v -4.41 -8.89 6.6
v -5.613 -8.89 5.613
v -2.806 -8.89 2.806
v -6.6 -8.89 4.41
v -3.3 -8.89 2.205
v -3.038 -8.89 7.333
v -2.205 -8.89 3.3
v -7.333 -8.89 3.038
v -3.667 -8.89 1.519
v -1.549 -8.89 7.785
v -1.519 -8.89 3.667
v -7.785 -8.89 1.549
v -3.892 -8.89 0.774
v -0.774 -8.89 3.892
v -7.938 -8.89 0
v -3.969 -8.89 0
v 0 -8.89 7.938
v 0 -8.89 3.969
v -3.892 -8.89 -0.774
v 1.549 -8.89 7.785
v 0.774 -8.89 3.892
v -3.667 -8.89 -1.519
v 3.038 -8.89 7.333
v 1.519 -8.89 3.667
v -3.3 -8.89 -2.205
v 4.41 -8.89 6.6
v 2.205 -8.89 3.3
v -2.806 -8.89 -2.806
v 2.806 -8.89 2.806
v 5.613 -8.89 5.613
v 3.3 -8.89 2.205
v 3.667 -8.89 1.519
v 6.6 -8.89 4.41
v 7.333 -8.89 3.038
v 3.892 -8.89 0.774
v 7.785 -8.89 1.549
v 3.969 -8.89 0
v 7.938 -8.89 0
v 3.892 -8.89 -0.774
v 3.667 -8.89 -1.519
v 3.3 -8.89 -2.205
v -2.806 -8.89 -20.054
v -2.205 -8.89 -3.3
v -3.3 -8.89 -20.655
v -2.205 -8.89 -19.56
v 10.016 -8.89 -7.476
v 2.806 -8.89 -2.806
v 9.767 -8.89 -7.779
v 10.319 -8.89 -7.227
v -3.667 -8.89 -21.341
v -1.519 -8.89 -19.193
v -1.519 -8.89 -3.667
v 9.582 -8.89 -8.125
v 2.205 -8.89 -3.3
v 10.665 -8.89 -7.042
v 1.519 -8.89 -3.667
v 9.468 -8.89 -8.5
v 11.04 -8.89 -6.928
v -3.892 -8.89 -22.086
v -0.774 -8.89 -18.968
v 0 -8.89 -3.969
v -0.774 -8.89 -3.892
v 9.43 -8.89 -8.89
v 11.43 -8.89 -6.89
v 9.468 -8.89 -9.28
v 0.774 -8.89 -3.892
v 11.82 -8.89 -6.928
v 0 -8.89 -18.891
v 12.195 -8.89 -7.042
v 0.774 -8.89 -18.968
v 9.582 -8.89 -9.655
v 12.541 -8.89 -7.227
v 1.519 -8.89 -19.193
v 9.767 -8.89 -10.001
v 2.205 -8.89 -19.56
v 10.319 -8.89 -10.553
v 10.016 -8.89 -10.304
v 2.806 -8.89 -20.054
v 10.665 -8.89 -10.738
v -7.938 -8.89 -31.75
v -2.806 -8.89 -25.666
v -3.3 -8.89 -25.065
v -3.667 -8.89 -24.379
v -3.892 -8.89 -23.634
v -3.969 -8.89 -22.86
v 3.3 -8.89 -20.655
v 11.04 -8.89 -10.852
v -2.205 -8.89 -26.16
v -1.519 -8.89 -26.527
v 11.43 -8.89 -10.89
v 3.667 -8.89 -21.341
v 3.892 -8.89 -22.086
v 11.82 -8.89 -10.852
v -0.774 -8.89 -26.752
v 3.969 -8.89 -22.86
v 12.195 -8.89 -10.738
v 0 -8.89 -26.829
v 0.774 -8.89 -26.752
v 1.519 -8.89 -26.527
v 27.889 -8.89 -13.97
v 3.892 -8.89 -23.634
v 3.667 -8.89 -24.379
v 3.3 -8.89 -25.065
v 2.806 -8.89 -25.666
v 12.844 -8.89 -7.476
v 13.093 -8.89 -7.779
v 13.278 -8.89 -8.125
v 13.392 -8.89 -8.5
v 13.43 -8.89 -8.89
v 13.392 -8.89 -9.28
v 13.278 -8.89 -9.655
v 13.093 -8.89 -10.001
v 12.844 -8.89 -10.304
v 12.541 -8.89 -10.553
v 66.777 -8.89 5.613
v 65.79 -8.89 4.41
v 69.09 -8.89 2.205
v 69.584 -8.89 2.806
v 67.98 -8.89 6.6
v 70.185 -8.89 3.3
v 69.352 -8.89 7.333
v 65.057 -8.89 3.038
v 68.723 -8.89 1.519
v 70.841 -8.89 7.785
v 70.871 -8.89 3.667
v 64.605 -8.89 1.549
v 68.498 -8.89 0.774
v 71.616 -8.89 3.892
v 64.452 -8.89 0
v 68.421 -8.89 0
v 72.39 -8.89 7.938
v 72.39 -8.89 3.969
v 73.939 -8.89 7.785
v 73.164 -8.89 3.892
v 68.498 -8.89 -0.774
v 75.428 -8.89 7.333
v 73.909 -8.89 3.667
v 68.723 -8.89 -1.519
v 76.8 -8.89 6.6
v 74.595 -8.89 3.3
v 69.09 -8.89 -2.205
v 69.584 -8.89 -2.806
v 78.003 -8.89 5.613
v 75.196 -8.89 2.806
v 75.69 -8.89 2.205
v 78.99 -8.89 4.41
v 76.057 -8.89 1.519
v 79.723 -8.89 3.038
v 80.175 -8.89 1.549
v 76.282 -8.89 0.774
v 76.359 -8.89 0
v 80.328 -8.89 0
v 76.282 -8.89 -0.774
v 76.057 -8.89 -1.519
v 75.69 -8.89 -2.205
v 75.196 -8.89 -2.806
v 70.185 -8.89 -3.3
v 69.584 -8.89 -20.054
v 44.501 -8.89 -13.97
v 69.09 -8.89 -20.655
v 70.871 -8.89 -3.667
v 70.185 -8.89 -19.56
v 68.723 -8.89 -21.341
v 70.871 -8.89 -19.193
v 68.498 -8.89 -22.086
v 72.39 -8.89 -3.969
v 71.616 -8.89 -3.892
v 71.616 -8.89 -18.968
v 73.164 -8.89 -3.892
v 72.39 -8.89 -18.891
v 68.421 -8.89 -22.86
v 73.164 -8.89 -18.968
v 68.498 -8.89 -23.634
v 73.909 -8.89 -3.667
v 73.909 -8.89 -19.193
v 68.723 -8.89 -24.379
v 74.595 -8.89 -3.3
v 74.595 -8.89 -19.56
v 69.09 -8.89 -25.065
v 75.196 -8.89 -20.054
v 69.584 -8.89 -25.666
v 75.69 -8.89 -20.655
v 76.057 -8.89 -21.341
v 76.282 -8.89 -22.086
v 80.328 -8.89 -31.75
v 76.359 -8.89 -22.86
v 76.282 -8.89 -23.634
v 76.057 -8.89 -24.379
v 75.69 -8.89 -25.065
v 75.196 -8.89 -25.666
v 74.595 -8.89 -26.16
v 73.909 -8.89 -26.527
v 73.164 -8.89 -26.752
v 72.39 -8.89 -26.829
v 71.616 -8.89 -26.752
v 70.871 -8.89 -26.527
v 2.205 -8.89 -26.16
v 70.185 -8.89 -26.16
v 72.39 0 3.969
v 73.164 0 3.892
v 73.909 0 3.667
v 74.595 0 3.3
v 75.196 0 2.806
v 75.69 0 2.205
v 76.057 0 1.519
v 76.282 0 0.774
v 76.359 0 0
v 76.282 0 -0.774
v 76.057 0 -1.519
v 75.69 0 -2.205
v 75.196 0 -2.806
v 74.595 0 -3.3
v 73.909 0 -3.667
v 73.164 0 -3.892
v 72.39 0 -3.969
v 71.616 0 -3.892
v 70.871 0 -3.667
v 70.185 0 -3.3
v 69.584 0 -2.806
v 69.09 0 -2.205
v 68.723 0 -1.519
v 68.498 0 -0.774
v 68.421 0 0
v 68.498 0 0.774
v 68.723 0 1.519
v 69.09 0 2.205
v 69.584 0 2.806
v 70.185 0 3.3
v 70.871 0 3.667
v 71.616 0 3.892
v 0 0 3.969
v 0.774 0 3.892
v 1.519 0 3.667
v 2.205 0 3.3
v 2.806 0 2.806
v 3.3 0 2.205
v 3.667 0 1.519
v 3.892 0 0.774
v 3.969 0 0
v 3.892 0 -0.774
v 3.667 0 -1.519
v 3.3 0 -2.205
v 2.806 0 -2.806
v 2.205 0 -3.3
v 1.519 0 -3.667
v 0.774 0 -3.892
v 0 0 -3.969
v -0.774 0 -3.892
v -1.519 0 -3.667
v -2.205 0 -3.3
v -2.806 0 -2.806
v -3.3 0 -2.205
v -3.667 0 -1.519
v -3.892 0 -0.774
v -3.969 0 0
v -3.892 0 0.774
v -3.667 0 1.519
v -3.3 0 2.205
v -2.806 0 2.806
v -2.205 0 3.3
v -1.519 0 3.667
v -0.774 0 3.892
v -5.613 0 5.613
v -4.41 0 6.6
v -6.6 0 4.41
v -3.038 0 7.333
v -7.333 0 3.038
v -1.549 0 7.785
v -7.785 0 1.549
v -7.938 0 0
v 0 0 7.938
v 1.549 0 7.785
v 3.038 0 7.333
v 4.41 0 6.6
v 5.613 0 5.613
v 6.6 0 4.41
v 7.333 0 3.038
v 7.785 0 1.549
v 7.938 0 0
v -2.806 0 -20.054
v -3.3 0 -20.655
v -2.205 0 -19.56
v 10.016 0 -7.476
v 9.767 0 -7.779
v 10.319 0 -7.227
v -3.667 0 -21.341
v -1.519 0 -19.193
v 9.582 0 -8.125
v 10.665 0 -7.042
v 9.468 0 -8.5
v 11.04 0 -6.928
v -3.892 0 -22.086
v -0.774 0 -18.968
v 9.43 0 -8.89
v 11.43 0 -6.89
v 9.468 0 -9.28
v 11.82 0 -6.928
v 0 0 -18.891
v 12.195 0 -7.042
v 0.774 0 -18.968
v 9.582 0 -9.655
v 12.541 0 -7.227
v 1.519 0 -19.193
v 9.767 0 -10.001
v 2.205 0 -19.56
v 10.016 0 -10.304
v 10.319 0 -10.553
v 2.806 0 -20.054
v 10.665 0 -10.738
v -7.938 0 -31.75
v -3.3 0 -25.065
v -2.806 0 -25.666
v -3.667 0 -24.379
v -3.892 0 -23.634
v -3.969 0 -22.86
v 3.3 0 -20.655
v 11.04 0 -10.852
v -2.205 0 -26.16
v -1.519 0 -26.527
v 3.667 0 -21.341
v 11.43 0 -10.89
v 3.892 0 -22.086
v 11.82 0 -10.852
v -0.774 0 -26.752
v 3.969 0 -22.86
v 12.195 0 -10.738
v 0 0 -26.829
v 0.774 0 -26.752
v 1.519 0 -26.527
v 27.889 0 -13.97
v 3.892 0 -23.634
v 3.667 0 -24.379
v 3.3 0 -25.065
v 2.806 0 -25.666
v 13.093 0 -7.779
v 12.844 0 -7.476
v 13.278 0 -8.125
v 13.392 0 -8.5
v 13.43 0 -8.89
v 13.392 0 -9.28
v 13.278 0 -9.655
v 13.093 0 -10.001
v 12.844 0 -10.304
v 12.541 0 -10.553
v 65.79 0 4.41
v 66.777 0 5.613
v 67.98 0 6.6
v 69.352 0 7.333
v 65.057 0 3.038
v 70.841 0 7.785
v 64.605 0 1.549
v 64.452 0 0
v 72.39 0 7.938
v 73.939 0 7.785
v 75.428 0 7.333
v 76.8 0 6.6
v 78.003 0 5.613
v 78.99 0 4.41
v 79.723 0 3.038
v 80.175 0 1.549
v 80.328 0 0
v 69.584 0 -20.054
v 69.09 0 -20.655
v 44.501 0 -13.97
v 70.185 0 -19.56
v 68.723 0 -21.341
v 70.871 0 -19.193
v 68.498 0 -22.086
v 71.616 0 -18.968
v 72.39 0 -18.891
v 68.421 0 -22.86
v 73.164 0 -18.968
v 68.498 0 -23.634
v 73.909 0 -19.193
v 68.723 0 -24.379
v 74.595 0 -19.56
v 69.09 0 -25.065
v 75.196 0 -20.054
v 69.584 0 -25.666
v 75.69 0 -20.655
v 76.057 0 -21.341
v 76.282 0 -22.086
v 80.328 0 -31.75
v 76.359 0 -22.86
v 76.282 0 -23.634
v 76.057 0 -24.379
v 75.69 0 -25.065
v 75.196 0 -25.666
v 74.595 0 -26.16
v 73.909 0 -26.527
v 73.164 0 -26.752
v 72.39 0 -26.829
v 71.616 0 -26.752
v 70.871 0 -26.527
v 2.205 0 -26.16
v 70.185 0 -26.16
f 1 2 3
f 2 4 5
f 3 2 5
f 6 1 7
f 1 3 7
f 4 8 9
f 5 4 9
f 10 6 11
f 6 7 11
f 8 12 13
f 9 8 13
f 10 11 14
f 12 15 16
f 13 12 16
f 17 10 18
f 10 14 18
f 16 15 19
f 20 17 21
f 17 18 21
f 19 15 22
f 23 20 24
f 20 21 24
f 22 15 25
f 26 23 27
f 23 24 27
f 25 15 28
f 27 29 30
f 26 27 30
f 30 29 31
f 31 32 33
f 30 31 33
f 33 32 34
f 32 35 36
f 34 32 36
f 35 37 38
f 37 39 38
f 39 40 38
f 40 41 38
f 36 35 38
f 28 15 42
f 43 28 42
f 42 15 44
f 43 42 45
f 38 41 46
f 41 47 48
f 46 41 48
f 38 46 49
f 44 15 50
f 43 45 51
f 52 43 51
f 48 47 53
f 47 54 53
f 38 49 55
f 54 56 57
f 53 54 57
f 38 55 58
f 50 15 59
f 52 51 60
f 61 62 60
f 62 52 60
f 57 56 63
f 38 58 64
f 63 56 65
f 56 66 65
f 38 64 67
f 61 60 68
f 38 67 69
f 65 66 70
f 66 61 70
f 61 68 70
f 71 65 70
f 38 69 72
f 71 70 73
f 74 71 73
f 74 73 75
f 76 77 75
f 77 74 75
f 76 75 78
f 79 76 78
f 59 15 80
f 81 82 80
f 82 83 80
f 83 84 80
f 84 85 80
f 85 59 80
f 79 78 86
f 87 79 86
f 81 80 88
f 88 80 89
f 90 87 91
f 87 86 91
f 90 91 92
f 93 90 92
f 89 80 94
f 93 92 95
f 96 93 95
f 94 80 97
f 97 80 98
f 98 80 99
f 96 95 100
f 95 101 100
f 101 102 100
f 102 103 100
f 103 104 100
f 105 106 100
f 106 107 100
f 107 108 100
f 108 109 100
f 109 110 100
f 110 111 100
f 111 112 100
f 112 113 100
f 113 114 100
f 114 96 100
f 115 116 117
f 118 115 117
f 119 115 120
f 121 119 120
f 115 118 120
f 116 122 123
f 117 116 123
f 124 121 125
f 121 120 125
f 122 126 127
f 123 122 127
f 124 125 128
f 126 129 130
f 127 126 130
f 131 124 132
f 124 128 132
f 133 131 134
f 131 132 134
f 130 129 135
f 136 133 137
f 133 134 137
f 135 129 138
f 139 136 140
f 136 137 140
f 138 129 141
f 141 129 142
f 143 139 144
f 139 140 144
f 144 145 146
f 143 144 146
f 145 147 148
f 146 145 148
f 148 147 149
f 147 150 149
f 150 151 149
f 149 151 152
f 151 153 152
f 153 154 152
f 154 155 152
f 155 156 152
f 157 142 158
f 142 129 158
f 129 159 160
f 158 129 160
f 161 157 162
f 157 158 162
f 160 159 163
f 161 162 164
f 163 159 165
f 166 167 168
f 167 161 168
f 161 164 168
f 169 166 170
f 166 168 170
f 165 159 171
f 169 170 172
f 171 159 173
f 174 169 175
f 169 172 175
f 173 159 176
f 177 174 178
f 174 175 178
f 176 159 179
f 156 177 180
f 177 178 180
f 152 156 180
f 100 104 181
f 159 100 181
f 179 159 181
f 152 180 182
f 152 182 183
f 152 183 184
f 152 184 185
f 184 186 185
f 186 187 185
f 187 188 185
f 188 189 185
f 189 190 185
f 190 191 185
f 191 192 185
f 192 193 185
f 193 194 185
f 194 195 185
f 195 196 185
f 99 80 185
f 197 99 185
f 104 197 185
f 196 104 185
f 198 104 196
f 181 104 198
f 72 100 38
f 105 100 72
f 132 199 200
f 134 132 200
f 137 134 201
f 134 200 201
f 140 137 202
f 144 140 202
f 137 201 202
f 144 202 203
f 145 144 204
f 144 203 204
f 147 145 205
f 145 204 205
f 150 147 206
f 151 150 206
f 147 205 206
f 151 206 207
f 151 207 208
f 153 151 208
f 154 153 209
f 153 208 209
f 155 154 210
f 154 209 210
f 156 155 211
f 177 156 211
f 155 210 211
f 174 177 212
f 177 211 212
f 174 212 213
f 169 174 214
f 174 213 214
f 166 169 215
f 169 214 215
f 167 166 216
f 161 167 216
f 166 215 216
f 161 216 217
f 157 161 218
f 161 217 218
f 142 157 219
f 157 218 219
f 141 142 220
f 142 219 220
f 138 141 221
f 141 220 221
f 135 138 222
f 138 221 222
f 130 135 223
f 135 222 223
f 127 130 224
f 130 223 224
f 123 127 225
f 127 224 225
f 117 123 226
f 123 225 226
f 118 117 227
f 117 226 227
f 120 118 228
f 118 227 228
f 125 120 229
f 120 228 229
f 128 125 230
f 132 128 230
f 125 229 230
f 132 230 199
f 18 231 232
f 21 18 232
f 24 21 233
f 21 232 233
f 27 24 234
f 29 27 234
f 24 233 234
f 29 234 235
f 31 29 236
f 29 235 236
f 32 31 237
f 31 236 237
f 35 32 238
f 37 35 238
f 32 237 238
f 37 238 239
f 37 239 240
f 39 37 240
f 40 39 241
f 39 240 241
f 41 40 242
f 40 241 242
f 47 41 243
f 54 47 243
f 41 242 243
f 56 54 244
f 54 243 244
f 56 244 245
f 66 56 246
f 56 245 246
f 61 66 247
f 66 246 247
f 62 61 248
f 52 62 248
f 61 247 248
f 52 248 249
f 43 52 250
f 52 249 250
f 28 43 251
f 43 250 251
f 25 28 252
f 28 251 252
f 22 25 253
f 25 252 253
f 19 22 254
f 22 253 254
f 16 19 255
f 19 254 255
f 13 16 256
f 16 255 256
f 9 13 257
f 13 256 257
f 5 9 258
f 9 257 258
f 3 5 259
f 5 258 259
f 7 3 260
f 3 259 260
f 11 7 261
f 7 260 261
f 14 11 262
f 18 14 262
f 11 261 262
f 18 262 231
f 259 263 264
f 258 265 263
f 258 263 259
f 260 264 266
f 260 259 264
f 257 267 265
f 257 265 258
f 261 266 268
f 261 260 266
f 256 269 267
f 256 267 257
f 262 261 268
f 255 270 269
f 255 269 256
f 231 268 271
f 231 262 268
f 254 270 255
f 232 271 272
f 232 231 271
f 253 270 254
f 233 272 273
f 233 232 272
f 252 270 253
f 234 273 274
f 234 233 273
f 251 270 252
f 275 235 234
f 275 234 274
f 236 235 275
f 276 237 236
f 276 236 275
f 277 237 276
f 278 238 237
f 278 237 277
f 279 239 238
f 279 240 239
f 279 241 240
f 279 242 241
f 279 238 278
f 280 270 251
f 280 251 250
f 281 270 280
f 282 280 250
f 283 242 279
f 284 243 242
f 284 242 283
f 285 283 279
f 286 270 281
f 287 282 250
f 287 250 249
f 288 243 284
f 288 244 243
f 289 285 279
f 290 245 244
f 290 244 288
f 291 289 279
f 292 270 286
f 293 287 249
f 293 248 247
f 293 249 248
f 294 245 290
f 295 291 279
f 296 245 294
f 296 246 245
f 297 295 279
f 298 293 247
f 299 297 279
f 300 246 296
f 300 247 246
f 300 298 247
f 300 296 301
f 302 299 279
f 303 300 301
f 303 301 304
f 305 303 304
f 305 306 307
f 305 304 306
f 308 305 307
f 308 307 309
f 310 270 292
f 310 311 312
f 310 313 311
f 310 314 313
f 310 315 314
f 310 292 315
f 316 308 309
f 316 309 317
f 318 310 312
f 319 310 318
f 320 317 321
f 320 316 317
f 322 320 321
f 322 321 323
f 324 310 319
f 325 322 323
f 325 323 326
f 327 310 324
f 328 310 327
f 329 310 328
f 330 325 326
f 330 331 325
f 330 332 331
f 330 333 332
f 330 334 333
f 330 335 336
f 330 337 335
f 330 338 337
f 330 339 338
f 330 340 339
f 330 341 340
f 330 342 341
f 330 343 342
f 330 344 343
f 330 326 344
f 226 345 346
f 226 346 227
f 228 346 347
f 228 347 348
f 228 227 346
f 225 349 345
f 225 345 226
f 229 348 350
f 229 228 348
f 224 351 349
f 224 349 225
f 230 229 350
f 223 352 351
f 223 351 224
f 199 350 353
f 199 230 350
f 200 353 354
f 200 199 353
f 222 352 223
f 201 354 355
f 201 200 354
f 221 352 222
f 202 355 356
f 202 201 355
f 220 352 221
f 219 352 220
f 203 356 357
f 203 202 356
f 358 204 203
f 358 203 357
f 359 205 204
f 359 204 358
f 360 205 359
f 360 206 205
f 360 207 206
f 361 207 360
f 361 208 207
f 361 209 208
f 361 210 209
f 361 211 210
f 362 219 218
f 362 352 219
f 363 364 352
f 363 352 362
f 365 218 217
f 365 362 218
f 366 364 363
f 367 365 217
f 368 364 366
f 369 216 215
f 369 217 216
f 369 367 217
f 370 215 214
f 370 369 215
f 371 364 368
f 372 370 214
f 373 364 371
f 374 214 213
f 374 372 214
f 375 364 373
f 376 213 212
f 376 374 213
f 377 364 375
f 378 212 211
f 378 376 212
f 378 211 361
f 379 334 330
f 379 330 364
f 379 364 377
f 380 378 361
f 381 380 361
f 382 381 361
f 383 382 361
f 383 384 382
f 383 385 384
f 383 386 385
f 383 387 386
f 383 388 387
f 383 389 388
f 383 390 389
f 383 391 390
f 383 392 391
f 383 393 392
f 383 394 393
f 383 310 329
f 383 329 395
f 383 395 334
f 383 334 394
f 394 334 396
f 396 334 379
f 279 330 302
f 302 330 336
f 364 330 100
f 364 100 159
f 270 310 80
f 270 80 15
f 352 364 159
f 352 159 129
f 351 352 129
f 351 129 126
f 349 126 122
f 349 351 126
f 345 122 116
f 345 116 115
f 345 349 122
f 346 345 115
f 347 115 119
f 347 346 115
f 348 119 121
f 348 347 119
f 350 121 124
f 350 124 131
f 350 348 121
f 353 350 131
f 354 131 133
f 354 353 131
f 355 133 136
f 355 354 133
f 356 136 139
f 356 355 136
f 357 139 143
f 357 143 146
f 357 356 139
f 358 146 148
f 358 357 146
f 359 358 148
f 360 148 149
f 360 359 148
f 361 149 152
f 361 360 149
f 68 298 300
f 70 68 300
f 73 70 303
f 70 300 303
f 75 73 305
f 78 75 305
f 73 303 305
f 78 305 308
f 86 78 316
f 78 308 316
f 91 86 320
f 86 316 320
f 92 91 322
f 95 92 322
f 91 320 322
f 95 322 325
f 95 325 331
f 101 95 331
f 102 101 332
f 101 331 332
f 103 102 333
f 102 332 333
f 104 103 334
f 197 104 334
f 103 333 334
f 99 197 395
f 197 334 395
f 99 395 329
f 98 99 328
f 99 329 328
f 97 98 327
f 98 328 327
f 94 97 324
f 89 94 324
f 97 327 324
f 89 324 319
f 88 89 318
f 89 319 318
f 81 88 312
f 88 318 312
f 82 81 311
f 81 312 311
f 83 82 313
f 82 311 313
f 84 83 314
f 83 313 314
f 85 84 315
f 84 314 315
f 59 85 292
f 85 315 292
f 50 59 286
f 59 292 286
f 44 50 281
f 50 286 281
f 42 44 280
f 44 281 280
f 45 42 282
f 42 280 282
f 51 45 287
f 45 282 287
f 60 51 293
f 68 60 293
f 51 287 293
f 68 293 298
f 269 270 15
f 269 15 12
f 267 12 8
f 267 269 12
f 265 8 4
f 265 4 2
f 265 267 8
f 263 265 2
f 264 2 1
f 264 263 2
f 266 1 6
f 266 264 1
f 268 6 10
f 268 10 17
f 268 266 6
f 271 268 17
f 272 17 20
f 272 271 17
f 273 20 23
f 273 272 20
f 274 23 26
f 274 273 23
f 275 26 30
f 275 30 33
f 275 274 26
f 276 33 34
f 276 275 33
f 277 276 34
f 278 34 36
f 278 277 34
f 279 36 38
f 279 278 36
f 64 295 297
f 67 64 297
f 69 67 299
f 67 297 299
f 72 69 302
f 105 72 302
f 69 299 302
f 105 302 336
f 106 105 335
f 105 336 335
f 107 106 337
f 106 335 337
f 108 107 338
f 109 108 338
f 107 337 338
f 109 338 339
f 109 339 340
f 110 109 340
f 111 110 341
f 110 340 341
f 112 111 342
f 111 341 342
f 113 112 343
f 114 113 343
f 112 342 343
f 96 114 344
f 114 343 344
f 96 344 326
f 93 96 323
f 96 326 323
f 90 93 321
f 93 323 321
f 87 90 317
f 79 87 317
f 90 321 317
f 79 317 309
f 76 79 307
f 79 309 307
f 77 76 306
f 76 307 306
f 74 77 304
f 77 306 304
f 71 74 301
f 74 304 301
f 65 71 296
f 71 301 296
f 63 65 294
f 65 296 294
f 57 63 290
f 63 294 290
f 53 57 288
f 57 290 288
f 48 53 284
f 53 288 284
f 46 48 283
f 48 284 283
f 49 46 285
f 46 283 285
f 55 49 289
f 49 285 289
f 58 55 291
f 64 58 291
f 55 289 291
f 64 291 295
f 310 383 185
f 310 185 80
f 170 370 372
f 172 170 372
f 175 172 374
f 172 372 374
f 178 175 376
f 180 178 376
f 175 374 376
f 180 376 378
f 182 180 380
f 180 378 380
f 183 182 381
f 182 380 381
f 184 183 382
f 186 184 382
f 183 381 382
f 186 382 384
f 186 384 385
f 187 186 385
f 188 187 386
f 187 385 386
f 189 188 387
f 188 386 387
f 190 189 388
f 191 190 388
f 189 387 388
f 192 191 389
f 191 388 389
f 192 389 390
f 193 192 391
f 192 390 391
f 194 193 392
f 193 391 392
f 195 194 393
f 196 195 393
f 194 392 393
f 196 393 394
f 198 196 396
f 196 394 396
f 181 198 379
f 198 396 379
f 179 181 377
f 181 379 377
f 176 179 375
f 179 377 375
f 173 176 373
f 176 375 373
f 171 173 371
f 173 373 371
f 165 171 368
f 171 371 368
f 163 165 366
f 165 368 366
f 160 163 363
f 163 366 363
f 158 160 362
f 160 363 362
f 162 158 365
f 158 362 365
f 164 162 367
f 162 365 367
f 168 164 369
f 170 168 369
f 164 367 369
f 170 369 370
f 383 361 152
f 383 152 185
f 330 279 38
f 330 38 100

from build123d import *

# Parameters (mm, degrees)
SKETCH1_R           = 3.96875
SKETCH1_R_2         = 2
BOSS_EXTRUDE1_DEPTH = 8.89


with BuildPart() as part:
    # Sketch1 → Boss-Extrude1 (new body)
    with BuildSketch(Plane(origin=(0, 0, 0), x_dir=(1, 0, 0), z_dir=(0, 1, 0))):
        with BuildLine():
            Line((80.3275, 31.75), (-7.9375, 31.75))
            Line((-7.9375, 31.75), (-7.9375, 13.97))
            Line((-7.9375, 13.97), (-7.9375, 0))
            ThreePointArc((-7.9375, 0), (0, -7.9375), (7.9375, 0))
            Line((7.9375, 0), (27.888727654, 13.97))
            Line((27.888727654, 13.97), (44.501272346, 13.97))
            Line((44.501272346, 13.97), (64.4525, 0))
            ThreePointArc((64.4525, 0), (72.39, -7.9375), (80.3275, 0))
            Line((80.3275, 0), (80.3275, 13.97))
            Line((80.3275, 13.97), (80.3275, 31.75))
        make_face()
        with Locations(Location((0, 0, 0), (0, 0, 270))):
            Circle(SKETCH1_R, mode=Mode.SUBTRACT)
        with Locations(Location((72.39, 0, 0), (0, 0, 270))):
            Circle(SKETCH1_R, mode=Mode.SUBTRACT)
        with Locations(Location((72.39, 22.86, 0), (0, 0, 270))):
            Circle(SKETCH1_R, mode=Mode.SUBTRACT)
        with Locations(Location((0, 22.86, 0), (0, 0, 270))):
            Circle(SKETCH1_R, mode=Mode.SUBTRACT)
        with Locations(Location((11.43, 8.89, 0), (0, 0, 270))):
            Circle(SKETCH1_R_2, mode=Mode.SUBTRACT)
    extrude(amount=-BOSS_EXTRUDE1_DEPTH)


solid = part.part
